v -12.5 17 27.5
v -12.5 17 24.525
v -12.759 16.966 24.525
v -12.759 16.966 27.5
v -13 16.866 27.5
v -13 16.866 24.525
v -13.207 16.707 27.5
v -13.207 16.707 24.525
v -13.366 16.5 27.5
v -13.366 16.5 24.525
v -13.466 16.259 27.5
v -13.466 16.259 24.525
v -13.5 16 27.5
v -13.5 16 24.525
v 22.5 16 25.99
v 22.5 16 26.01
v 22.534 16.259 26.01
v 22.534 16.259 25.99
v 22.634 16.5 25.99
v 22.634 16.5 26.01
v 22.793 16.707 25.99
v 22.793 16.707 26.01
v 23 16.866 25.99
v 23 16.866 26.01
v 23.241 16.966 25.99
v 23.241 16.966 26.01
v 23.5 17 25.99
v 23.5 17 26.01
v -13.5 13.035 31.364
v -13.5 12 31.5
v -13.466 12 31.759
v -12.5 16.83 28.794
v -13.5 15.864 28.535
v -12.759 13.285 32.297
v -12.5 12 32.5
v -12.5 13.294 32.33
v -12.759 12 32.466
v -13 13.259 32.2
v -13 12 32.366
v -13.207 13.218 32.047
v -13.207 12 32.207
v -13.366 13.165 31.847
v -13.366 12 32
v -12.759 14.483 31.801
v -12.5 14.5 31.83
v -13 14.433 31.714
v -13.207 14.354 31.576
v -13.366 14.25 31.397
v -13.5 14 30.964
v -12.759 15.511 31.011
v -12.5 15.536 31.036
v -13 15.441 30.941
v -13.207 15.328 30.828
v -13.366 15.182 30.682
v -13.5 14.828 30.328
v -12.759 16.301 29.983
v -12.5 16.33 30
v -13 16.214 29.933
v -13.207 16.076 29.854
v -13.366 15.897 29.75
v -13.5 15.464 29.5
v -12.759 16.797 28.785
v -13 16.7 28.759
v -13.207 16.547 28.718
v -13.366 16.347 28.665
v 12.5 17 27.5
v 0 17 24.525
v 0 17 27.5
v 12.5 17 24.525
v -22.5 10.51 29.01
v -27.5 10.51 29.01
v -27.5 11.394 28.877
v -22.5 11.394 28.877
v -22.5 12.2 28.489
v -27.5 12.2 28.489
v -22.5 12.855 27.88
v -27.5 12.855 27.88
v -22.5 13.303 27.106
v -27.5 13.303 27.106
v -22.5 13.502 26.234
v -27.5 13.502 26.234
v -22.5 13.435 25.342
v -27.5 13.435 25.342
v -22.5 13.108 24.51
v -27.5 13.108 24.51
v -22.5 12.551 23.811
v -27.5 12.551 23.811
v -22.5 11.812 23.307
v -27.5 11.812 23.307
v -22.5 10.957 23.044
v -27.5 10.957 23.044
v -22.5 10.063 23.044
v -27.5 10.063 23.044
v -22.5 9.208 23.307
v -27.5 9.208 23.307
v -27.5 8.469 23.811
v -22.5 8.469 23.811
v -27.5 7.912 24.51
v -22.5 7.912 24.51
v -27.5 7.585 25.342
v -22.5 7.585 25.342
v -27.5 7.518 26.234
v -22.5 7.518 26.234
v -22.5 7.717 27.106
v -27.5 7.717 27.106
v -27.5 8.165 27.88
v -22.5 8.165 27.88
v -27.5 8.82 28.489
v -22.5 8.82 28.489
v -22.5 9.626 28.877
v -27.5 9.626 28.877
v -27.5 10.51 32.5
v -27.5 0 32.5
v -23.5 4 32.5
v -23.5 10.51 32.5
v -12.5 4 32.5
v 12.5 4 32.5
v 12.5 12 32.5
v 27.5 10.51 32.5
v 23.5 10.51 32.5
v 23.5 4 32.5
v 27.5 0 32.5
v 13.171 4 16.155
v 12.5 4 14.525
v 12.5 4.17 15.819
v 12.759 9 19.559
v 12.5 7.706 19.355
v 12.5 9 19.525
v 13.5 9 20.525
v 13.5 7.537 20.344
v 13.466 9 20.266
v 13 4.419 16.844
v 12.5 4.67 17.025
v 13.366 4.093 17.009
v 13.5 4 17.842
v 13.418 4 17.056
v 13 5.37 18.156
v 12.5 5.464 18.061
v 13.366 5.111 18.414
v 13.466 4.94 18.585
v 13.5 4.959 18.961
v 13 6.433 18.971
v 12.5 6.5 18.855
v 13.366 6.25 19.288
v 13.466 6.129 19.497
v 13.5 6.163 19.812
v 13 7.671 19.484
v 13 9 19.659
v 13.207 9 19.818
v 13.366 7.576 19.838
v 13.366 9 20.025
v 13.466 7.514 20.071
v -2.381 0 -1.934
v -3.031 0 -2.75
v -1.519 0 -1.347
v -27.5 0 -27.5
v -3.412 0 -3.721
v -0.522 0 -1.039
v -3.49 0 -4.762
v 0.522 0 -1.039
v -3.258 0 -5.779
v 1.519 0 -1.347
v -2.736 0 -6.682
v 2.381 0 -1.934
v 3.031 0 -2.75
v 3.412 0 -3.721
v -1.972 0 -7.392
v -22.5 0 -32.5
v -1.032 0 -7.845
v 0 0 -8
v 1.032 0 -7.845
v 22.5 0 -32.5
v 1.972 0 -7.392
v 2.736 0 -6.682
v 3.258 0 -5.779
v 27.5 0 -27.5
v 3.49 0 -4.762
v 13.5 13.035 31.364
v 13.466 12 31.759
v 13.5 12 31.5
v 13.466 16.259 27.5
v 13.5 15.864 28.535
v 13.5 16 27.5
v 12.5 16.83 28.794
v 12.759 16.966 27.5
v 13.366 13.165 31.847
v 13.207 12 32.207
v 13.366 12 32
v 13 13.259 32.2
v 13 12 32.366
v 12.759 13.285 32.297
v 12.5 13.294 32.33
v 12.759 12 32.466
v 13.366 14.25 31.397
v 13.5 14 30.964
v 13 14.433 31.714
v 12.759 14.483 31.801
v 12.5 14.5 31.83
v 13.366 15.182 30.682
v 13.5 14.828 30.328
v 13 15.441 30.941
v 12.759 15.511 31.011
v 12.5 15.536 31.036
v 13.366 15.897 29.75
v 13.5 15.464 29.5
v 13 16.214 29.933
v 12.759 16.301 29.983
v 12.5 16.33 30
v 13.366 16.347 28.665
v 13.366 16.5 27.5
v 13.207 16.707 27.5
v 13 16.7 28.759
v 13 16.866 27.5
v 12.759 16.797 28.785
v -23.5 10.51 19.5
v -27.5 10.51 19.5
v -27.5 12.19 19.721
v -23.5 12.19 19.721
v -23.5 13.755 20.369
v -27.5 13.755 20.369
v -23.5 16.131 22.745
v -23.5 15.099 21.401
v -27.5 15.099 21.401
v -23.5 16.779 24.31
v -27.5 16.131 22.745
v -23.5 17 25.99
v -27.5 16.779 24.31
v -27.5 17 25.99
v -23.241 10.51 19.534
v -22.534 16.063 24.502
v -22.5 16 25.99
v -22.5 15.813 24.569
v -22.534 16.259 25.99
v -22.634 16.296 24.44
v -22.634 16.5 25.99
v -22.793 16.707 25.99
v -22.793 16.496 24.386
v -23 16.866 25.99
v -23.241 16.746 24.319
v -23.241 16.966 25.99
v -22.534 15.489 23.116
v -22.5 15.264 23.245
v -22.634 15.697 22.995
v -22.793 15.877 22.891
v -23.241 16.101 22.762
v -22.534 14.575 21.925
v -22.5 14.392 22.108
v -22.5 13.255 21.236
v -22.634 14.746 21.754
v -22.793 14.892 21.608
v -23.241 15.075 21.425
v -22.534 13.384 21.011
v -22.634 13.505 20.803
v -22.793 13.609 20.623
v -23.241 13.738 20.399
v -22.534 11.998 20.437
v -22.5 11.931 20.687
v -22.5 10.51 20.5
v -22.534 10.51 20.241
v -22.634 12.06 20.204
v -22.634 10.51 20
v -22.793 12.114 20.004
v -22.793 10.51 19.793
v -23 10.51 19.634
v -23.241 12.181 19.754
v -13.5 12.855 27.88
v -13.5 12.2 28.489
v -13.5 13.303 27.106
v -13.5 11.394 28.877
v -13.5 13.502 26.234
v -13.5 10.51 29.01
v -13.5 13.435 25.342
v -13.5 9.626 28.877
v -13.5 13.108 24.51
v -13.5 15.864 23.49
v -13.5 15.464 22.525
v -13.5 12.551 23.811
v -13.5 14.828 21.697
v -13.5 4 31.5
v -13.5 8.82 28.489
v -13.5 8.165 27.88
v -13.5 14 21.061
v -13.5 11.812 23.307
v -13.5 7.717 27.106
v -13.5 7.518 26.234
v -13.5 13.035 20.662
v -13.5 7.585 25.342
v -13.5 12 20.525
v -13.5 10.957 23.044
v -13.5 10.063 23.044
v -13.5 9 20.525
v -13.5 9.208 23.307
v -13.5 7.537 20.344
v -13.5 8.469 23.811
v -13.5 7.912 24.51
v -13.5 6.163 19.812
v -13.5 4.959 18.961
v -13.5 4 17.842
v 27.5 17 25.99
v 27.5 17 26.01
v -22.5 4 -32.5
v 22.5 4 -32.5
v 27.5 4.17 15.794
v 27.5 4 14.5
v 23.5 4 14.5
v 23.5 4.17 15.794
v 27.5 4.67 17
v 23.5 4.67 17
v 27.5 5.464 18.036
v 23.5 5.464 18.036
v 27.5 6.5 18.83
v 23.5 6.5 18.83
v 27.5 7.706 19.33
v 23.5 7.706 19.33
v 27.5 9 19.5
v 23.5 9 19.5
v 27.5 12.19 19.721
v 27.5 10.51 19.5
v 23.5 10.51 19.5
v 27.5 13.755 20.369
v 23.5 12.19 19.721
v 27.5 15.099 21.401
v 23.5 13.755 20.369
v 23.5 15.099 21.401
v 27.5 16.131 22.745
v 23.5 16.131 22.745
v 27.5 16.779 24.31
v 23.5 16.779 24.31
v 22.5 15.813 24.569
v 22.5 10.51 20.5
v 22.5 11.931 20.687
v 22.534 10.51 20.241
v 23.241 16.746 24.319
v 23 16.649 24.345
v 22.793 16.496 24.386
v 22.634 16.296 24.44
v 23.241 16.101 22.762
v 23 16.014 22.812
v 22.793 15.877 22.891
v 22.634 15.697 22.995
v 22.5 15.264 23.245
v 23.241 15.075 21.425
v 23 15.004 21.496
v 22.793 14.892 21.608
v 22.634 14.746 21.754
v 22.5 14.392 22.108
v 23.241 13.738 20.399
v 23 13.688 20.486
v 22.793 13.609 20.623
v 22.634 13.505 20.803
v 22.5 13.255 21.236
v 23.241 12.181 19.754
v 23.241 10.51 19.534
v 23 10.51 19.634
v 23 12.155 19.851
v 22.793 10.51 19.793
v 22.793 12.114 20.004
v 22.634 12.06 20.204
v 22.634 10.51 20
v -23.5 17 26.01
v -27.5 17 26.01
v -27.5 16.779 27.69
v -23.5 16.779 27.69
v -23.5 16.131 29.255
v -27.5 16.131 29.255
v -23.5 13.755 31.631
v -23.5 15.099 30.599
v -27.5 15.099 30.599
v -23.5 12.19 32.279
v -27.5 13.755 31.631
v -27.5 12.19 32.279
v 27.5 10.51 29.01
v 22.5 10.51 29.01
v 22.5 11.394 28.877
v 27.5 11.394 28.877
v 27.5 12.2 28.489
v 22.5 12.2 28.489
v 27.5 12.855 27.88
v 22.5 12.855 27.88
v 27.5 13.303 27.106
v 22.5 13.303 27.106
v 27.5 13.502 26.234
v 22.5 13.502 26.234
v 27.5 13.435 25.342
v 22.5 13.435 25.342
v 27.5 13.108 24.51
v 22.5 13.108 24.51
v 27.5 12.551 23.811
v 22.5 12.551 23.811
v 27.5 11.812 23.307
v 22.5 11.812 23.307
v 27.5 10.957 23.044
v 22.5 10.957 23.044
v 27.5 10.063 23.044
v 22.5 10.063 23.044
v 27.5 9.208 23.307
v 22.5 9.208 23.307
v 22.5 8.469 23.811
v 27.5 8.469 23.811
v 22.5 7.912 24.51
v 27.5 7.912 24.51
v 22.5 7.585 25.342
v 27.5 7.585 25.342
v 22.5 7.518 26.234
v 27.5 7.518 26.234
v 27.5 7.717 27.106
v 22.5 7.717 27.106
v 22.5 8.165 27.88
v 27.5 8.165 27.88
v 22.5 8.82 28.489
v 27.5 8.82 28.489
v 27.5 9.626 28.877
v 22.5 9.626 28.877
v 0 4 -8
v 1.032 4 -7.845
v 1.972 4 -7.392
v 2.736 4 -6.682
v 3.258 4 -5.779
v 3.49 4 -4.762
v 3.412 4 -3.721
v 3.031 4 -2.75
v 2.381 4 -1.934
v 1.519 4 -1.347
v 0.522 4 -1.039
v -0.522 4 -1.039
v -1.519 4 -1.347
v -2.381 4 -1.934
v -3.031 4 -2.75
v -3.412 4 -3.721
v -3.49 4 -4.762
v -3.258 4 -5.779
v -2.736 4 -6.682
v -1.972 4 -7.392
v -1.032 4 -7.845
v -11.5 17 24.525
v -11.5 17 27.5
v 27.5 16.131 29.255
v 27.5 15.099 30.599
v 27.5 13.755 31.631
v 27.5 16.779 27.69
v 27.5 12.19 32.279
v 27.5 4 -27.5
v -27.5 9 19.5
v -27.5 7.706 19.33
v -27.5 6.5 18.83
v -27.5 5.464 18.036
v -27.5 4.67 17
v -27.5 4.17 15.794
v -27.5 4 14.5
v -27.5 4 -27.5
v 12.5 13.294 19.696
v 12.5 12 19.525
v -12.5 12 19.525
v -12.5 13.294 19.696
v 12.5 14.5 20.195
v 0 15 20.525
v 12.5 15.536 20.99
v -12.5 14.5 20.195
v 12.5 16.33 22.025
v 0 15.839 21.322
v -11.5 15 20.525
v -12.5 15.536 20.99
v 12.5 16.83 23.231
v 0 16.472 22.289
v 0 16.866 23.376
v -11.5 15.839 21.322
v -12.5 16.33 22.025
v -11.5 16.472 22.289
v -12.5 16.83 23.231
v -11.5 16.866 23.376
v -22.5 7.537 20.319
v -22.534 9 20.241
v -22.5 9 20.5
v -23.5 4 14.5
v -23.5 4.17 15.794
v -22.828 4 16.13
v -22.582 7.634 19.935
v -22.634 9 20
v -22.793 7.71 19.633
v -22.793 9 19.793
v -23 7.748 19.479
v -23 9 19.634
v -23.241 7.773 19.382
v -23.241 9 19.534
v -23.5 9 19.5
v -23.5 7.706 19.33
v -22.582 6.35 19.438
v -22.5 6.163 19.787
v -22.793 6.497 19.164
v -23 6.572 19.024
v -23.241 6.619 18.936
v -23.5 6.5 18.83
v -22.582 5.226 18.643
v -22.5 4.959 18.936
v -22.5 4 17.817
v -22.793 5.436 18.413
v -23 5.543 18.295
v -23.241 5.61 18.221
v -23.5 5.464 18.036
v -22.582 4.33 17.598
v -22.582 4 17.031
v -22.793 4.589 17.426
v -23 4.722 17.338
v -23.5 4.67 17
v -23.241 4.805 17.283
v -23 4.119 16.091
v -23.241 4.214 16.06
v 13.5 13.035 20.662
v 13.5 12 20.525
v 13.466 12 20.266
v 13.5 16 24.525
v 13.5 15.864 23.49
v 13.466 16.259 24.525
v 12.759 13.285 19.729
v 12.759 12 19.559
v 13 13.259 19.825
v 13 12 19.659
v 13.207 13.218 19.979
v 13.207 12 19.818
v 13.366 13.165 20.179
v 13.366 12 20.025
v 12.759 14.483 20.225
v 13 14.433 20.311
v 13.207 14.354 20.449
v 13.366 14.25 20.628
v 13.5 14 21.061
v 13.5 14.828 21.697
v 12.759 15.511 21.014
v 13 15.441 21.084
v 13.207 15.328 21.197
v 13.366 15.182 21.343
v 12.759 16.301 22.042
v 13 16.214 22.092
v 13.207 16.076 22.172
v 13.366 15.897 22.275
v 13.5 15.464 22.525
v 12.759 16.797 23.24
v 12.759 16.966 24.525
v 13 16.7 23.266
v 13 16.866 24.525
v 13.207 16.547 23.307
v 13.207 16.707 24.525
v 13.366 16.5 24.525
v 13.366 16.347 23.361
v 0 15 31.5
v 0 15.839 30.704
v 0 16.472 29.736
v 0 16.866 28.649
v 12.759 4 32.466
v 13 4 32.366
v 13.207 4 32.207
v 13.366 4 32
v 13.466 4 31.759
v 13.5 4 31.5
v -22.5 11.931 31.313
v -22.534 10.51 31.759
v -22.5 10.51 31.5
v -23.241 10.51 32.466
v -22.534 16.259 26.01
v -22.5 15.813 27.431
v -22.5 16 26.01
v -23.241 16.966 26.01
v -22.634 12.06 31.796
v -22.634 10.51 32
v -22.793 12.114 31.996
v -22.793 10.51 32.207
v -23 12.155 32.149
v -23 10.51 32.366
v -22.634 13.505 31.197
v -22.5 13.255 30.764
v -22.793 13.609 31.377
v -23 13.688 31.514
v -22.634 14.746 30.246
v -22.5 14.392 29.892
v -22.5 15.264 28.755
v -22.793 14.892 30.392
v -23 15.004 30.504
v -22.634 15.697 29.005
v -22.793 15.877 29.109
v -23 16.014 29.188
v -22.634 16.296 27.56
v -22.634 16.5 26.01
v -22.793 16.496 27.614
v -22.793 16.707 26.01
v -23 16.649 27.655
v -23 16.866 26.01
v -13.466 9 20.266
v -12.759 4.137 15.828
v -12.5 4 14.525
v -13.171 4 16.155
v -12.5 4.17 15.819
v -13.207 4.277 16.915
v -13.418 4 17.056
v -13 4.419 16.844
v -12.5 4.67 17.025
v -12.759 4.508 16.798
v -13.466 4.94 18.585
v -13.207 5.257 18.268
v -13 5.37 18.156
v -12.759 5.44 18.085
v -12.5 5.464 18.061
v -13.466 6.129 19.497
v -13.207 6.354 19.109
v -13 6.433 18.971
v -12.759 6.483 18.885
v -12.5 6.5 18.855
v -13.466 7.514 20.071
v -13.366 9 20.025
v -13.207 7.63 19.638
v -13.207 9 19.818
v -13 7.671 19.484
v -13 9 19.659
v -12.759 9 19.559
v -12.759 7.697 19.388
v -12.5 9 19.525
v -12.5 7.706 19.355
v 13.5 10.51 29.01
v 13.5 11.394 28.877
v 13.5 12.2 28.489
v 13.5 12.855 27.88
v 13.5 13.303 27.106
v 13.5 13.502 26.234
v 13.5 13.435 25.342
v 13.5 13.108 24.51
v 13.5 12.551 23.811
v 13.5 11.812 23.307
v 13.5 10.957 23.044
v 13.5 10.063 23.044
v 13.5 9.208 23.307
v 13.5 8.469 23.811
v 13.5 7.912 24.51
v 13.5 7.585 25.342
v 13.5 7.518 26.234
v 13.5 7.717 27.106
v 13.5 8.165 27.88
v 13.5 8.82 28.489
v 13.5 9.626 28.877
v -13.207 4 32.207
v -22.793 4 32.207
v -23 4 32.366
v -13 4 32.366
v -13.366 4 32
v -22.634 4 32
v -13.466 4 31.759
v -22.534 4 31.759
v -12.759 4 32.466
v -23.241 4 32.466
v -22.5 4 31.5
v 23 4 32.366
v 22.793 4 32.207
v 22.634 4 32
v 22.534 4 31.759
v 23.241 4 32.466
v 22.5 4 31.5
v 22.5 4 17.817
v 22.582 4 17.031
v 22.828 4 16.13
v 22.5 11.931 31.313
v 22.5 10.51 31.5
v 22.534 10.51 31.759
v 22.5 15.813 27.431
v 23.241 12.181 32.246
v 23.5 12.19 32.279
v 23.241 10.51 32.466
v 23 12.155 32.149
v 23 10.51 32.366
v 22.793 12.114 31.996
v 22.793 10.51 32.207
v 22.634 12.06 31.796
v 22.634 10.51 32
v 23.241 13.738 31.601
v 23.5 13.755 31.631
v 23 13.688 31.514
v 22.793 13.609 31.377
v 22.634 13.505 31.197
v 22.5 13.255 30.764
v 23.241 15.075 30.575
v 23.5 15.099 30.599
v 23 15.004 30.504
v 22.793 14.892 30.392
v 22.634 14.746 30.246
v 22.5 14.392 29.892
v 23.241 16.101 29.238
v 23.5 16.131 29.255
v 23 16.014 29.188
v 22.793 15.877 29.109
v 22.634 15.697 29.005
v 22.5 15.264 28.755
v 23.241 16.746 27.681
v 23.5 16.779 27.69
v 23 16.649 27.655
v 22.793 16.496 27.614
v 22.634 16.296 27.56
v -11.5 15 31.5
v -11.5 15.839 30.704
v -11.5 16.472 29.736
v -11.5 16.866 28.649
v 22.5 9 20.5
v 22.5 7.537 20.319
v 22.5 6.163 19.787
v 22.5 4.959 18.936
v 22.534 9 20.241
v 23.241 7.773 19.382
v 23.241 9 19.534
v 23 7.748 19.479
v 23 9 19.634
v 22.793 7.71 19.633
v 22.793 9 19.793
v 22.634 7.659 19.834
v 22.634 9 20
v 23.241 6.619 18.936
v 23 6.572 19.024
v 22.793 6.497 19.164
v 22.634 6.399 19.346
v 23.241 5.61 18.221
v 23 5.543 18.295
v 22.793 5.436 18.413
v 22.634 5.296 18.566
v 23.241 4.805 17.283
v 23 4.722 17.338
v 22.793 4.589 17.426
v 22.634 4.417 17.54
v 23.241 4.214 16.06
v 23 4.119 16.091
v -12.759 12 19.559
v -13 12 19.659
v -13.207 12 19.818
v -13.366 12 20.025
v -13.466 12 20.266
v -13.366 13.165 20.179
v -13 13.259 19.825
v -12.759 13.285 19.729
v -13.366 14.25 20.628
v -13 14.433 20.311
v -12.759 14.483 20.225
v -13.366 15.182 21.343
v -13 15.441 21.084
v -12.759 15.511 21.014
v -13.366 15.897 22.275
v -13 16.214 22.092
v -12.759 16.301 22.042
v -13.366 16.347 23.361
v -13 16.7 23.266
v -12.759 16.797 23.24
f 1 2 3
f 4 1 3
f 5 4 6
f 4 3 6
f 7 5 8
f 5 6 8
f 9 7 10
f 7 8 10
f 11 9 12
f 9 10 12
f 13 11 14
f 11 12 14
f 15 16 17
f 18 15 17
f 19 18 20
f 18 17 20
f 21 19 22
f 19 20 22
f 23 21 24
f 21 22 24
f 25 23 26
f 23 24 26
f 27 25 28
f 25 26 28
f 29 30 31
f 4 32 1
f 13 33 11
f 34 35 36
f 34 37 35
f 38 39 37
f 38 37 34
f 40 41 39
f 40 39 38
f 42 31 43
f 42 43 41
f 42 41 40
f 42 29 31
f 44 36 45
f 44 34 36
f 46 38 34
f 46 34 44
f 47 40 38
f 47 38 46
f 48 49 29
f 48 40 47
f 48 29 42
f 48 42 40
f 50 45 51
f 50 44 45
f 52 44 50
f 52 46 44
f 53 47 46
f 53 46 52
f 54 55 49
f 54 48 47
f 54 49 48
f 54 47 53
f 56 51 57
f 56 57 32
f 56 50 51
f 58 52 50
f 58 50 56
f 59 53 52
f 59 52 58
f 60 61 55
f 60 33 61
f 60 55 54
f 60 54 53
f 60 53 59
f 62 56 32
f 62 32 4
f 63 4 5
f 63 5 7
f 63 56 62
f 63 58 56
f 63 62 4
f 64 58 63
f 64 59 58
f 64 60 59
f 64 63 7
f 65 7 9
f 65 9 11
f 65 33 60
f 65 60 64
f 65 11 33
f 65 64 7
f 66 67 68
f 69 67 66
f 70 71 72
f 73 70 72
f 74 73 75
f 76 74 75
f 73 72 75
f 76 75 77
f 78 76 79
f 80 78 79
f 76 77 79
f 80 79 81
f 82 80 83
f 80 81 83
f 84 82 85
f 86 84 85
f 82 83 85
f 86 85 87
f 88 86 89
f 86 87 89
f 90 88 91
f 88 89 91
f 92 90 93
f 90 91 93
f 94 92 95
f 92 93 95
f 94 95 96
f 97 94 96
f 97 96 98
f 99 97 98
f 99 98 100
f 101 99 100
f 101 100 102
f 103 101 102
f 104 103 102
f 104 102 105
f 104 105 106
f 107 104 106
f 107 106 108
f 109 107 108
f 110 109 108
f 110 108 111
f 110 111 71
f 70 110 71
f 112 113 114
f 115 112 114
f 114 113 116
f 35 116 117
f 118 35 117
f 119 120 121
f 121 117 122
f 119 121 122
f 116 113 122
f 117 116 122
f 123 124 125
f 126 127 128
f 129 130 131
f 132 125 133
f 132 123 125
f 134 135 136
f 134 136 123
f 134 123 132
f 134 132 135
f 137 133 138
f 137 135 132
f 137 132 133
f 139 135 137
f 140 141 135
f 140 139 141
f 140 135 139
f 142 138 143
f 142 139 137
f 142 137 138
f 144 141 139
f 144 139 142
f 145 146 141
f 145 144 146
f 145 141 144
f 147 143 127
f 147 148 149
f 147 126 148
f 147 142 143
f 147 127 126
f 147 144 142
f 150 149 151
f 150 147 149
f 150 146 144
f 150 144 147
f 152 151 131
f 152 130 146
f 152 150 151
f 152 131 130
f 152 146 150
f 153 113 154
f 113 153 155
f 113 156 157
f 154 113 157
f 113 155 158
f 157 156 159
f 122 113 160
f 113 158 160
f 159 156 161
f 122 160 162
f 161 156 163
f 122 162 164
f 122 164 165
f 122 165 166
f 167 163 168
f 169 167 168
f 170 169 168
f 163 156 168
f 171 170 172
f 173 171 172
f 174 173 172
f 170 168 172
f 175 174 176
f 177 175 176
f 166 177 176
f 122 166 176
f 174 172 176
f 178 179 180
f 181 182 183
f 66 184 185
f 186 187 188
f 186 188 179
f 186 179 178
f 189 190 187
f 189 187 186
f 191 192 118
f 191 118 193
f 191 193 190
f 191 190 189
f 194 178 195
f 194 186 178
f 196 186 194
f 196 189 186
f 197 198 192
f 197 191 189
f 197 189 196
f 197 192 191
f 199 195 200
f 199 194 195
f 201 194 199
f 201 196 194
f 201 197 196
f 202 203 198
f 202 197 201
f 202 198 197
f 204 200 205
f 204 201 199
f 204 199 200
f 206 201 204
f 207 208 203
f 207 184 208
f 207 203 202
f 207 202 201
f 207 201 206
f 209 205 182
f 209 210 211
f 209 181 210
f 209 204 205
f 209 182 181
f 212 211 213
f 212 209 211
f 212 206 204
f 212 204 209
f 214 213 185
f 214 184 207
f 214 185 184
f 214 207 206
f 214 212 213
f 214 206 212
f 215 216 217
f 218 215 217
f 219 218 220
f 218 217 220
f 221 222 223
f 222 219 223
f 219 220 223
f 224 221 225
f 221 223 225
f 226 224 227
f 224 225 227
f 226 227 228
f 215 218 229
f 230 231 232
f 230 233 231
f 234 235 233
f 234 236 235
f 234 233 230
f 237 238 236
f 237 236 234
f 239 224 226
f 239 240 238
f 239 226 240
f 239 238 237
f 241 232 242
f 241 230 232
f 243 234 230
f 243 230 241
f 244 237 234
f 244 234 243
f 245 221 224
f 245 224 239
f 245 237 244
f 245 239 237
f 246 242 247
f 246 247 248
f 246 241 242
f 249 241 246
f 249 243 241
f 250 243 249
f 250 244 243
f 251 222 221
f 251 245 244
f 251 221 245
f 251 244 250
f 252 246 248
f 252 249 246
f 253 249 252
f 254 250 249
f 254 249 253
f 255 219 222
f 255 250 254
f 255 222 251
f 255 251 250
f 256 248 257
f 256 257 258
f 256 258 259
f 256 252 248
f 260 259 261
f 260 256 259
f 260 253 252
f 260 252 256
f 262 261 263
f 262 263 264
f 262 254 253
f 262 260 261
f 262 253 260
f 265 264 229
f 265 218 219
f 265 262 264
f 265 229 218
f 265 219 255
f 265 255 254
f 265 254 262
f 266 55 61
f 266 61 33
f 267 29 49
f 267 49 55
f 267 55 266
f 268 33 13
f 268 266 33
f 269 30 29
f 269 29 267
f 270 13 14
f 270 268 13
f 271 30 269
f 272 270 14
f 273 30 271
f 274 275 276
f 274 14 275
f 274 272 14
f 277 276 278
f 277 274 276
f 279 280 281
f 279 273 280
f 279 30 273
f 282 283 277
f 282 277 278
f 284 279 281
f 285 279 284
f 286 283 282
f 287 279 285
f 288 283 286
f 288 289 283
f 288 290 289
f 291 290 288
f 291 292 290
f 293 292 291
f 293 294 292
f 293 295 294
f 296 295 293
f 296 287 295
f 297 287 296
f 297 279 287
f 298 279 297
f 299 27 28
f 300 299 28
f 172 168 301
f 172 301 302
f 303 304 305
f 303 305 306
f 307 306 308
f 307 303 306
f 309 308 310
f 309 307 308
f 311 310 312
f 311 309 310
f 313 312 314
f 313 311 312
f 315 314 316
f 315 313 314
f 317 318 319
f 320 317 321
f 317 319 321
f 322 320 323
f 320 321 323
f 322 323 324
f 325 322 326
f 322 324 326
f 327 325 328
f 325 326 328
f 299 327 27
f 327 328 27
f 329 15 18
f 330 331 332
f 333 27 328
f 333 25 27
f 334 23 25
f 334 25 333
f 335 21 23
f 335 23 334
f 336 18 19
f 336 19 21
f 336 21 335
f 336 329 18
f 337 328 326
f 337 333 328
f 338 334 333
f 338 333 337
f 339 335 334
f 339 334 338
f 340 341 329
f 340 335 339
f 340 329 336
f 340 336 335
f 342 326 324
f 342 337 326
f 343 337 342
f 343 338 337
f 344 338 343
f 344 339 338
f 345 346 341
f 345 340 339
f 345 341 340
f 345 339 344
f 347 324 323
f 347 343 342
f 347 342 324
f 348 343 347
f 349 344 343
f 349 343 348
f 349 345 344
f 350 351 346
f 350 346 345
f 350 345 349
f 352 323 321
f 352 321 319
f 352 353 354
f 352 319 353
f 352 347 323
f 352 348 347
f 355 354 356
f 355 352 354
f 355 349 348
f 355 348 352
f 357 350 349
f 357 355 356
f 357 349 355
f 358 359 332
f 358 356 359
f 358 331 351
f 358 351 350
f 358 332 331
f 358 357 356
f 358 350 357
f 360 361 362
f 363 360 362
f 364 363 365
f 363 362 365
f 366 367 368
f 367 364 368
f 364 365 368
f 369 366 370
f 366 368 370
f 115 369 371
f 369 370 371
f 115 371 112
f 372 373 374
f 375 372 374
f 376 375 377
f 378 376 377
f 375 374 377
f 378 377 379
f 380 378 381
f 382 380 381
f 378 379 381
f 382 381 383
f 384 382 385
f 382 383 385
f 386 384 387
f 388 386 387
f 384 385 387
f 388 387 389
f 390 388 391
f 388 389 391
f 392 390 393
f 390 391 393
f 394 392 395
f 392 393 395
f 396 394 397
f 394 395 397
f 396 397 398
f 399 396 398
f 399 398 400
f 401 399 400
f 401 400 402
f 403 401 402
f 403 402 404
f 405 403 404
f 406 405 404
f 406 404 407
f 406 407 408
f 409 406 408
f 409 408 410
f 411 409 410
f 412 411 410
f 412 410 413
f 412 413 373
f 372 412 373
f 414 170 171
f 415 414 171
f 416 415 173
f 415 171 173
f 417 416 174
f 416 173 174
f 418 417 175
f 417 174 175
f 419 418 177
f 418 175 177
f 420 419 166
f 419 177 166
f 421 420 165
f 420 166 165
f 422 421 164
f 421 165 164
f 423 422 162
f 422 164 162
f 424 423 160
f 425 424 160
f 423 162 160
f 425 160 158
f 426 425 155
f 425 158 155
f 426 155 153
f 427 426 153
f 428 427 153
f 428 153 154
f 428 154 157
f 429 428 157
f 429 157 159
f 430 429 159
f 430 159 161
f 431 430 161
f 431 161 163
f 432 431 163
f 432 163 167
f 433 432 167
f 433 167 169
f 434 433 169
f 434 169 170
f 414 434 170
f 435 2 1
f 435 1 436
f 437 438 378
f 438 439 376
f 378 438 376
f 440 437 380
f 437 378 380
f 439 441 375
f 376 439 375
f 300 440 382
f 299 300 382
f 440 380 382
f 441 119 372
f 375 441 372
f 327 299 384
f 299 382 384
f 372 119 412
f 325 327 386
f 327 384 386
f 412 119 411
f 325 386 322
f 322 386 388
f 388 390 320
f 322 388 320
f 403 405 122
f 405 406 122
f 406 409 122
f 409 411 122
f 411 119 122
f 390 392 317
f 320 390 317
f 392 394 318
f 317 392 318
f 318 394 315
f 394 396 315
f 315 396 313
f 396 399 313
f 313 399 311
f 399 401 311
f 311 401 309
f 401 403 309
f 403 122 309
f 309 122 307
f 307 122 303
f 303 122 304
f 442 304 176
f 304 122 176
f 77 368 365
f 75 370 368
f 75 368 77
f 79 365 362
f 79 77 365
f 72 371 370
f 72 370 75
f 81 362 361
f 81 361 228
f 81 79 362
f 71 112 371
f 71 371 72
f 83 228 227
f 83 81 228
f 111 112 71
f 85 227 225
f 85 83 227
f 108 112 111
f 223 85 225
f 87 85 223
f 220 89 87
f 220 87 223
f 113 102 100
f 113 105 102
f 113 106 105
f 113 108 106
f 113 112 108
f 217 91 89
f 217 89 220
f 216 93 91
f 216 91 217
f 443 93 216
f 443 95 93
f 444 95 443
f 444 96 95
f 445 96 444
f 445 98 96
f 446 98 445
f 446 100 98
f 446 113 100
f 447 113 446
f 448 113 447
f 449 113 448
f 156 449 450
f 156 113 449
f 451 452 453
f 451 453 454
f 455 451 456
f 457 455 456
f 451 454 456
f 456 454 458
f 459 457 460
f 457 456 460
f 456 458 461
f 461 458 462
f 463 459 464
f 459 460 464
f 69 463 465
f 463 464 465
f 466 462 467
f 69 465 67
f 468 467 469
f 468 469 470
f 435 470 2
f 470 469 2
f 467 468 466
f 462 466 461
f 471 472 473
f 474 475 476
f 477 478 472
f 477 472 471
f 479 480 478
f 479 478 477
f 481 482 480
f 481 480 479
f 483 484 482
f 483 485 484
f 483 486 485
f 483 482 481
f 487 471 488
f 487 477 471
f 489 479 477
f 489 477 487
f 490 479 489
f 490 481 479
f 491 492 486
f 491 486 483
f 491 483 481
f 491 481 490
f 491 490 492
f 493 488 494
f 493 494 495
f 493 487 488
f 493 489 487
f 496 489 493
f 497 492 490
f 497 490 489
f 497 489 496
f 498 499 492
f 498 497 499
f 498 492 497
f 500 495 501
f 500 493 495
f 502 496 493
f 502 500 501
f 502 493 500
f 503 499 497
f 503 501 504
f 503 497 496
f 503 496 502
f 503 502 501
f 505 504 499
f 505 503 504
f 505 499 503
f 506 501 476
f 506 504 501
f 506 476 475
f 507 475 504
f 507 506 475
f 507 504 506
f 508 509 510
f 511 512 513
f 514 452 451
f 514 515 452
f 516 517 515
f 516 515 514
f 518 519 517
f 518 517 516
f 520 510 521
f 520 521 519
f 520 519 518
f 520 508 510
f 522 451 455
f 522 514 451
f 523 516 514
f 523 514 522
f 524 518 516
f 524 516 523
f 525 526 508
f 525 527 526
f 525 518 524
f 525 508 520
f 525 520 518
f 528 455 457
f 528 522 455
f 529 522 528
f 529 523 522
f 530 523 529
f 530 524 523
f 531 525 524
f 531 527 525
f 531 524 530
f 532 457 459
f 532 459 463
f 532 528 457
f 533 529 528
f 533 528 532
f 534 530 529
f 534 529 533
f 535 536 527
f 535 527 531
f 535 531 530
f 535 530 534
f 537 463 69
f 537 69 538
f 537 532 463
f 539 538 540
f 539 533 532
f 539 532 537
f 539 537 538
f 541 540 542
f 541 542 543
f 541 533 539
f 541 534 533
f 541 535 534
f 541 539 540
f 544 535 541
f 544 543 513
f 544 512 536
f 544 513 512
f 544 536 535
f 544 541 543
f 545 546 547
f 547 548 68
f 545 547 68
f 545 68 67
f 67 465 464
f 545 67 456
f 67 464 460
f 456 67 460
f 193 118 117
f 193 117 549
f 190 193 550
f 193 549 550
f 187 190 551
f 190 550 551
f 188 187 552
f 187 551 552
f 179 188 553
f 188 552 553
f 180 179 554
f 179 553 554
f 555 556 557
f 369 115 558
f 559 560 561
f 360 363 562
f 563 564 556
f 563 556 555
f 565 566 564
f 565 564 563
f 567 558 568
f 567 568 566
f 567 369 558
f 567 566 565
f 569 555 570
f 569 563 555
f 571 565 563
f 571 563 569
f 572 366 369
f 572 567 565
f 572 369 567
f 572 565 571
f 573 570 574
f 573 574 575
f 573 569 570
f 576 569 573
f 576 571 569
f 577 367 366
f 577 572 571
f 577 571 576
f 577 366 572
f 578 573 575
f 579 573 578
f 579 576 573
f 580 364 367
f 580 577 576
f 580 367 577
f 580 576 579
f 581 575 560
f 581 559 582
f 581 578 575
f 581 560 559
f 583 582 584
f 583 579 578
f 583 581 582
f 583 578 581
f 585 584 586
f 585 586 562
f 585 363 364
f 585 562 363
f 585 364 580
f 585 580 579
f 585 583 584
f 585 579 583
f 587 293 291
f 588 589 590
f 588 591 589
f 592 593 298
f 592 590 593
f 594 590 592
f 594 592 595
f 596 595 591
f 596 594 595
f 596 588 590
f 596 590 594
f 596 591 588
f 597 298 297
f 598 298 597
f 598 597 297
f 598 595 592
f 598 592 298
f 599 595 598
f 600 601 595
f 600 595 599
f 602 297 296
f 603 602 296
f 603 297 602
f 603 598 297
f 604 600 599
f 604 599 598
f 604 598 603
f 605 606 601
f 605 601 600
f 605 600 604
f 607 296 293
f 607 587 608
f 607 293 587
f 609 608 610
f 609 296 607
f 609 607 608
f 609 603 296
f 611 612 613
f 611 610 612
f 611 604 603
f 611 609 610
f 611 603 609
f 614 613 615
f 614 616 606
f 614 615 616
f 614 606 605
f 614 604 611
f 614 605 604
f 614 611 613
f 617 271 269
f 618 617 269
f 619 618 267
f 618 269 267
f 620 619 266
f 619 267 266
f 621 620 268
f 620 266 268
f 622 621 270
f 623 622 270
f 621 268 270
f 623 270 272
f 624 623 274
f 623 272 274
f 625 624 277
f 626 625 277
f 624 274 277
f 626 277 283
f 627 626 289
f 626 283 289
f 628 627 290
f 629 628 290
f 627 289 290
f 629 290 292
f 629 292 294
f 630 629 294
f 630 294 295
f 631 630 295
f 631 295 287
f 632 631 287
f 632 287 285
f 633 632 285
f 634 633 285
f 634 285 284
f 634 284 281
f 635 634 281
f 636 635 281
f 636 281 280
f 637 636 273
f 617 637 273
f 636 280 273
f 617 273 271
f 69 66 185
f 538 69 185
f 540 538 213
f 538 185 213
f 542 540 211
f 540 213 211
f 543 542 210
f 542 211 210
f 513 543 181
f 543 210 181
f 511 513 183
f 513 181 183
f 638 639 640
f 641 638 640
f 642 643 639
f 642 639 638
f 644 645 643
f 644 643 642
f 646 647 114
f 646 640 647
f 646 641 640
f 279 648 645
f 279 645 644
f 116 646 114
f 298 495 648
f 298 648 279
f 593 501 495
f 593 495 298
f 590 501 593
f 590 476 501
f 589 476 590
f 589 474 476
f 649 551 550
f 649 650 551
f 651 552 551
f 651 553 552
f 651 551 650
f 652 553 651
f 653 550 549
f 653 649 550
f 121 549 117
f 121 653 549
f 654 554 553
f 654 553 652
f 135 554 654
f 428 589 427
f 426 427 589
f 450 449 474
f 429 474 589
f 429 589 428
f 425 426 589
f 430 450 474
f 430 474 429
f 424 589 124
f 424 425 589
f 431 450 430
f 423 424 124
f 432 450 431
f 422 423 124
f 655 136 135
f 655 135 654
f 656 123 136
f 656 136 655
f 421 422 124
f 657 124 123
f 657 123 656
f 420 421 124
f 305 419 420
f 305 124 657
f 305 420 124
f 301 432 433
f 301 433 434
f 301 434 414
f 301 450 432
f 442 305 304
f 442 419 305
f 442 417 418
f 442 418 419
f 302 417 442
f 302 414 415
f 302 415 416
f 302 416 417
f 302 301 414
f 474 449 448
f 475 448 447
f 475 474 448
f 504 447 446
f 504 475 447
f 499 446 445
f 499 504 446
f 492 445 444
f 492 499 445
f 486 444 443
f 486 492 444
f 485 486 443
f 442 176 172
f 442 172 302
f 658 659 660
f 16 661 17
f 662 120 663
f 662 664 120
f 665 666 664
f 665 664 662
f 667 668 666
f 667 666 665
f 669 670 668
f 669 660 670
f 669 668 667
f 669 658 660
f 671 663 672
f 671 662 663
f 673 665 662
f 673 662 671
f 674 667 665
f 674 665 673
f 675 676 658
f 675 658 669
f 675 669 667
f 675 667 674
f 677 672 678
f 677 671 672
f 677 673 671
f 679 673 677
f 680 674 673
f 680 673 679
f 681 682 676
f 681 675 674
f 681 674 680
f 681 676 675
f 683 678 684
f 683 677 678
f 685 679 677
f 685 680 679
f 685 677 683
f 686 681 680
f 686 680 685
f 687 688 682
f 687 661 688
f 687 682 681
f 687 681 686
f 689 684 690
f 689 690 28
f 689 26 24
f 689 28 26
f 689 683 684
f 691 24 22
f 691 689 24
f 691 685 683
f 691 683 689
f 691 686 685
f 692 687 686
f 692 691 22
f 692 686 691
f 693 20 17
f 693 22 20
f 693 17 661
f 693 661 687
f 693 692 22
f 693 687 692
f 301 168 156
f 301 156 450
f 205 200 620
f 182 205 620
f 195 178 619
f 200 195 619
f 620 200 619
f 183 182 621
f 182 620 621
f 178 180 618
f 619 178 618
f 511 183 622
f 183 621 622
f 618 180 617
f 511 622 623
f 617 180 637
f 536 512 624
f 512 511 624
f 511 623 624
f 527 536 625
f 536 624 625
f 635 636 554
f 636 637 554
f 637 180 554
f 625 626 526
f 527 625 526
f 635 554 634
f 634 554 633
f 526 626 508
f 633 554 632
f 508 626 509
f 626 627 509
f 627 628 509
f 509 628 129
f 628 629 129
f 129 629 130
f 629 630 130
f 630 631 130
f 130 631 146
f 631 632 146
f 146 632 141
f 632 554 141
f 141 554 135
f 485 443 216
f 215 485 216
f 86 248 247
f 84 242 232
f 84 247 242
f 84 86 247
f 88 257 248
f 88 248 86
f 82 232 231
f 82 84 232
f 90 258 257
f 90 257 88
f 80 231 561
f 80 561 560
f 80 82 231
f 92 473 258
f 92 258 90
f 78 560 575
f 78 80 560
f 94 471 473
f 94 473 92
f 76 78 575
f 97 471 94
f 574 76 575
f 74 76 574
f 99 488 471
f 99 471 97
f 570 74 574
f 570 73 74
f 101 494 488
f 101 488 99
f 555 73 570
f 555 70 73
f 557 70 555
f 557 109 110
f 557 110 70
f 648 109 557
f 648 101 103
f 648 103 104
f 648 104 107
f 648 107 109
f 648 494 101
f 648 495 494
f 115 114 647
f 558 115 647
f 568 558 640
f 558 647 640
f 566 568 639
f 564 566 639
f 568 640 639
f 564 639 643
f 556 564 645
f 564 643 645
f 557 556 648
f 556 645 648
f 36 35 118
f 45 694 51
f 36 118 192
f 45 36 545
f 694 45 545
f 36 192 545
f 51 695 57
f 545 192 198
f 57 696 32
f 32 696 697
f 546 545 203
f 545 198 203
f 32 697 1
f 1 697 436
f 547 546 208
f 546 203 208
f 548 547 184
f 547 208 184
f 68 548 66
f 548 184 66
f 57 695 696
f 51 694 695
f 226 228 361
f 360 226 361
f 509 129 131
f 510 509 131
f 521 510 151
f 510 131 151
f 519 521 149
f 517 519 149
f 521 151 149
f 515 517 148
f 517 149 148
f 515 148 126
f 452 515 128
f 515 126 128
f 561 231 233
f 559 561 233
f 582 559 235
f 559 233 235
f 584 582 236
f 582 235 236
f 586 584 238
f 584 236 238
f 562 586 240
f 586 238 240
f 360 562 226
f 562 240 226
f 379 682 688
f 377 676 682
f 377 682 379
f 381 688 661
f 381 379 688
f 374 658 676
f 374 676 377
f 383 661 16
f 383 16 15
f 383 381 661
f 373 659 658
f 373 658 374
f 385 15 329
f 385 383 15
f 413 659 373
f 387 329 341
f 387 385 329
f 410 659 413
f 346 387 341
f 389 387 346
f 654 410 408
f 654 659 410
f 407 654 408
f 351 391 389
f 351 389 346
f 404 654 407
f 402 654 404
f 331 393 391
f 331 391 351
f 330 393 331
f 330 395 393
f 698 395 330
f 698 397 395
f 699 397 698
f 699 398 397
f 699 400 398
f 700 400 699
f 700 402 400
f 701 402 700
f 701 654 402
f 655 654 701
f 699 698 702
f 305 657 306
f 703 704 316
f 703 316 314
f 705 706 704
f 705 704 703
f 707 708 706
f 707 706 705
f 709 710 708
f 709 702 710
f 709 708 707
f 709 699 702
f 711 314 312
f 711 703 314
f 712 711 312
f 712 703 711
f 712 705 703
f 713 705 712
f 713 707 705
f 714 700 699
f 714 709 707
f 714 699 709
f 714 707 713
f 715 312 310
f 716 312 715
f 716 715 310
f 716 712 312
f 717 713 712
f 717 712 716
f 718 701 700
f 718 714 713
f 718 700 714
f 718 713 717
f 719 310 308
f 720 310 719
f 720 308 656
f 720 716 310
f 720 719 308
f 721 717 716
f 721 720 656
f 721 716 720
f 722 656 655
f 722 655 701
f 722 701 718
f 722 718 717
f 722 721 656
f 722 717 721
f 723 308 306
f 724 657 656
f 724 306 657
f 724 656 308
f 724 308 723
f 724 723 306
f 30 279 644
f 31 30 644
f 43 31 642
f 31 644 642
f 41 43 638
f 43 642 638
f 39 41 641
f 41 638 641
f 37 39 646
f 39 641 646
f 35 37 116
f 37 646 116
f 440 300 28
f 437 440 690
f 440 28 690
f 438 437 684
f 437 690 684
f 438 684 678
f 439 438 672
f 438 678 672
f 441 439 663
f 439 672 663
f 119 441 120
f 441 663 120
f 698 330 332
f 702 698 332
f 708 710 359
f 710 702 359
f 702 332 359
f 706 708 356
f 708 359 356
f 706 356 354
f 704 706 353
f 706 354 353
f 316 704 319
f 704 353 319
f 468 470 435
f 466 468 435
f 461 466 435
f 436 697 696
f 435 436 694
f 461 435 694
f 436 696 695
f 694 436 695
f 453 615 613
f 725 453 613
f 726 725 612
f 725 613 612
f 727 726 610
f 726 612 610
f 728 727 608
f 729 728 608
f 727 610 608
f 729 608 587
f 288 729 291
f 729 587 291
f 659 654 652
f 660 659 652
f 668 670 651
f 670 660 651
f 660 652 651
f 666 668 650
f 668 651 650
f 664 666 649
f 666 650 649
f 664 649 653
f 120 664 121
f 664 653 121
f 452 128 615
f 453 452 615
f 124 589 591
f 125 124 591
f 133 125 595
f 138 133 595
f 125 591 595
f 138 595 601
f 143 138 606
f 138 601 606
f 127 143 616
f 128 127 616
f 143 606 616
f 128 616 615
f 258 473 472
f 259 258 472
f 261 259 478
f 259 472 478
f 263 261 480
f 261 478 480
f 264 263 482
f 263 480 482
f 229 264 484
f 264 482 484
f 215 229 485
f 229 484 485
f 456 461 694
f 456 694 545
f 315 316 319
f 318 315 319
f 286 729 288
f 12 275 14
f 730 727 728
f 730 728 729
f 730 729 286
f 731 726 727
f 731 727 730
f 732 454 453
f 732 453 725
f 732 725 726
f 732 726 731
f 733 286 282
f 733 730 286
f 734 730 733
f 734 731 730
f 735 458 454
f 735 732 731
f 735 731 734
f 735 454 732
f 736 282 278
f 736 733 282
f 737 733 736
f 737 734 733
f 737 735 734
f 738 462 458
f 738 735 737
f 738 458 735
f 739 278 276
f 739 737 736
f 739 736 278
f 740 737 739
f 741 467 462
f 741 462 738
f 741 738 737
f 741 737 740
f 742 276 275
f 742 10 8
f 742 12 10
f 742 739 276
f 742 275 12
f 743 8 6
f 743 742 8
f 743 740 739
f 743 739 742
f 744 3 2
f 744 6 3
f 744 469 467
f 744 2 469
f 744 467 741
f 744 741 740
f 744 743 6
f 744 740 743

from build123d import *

# Parameters (mm, degrees)
CROQUIS1_W              = 55
CROQUIS1_H              = 65
SALIENTE_EXTRUIR1_DEPTH = 4
CROQUIS5_R              = 3.5
CORTAR_EXTRUIR5_DEPTH   = 72
CHAFL_N1_SIZE           = 5
CROQUIS6_R              = 3
SALIENTE_EXTRUIR2_DEPTH = 55
REDONDEO1_R             = 5
CROQUIS7_W              = 45
CROQUIS7_H              = 13
CROQUIS7_H_2            = 7.525704533
CORTAR_EXTRUIR7_DEPTH   = 20
REDONDEO2_R             = 1
CROQUIS8_W              = 13.499994095
CROQUIS8_H              = 12.974747115
SALIENTE_EXTRUIR3_DEPTH = 13
REDONDEO3_R             = 5
REDONDEO4_R             = 5
REDONDEO5_R             = 1
CROQUIS10_R             = 3
CORTAR_EXTRUIR8_DEPTH   = 26.999988191
CROQUIS11_W             = 11.5
CROQUIS11_H             = 5.447296535
CROQUIS11_H_2           = 2.974747115
CORTAR_EXTRUIR9_DEPTH   = 2


with BuildPart() as part:
    # Croquis1 → Saliente-Extruir1 (new body)
    with BuildSketch(Plane(origin=(0, 0, 0), x_dir=(1, 0, 0), z_dir=(0, 1, 0))):
        Rectangle(CROQUIS1_W, CROQUIS1_H)
    extrude(amount=SALIENTE_EXTRUIR1_DEPTH)

    # Croquis5 → Cortar-Extruir5 (cut)
    with BuildSketch(Plane.XZ):
        with Locations(Location((0, -4.5, 0), (0, 0, 270))):
            Circle(CROQUIS5_R)
    extrude(amount=-CORTAR_EXTRUIR5_DEPTH, mode=Mode.SUBTRACT)

    # Chaflán1
    chafl_n1_edges = [part.edges().sort_by_distance(p)[0] for p in [
        (-27.5, 2, -32.5),
        (27.5, 2, -32.5),
    ]]
    chamfer(chafl_n1_edges, length=CHAFL_N1_SIZE)

    # Croquis6 → Saliente-Extruir2 (add)
    with BuildSketch(Plane.ZY.offset(27.5)):
        with BuildLine():
            Line((32.5, 0), (19.5, 0))
            Line((19.5, 0), (19.5, 10.51))
            ThreePointArc((19.5, 10.51), (21.40087699, 15.09912301), (25.99, 17))
            Line((25.99, 17), (26.01, 17))
            ThreePointArc((26.01, 17), (30.59912301, 15.09912301), (32.5, 10.51))
            Line((32.5, 10.51), (32.5, 0))
        make_face()
        with Locations((26.01, 10.51)):
            Circle(CROQUIS6_R, mode=Mode.SUBTRACT)
    extrude(amount=-SALIENTE_EXTRUIR2_DEPTH)

    # Redondeo1
    redondeo1_edges = [part.edges().sort_by_distance(p)[0] for p in [
        (0, 4, 19.5),
    ]]
    fillet(redondeo1_edges, radius=REDONDEO1_R)

    # Croquis7 → Cortar-Extruir7 (cut)
    with BuildSketch(Plane(origin=(0, 4, 0), x_dir=(1, 0, 0), z_dir=(0, 1, 0))):
        with Locations((0, -26)):
            Rectangle(CROQUIS7_W, CROQUIS7_H)
        with Locations((0, -15.737147734)):
            Rectangle(CROQUIS7_W, CROQUIS7_H_2)
    extrude(amount=CORTAR_EXTRUIR7_DEPTH, mode=Mode.SUBTRACT)

    # Redondeo2
    # the kernel refuses this fillet: 1 mm, written as the material it takes off along each edge
    with BuildSketch(Plane(origin=(22.5, 9, 14.5), x_dir=(0, 0, 1), z_dir=(0, 1, 0))) as redondeo2_piece_1_section:
        with BuildLine():
            CenterArc((5 + REDONDEO2_R, REDONDEO2_R), REDONDEO2_R, 180, 90)
            Line((5 + REDONDEO2_R, 0), (5, 0))
            Line((5, 0), (5, REDONDEO2_R))
        make_face()
    redondeo2_piece_1 = revolve(axis=Axis((22.5, 9, 14.5), (1, 0, 0)), revolution_arc=138.720976341, mode=Mode.PRIVATE)
    redondeo2_piece_1 = split(redondeo2_piece_1, bisect_by=Plane(origin=(22.5, 4, 14.5), z_dir=(0, 1, 0)), keep=Keep.TOP, mode=Mode.PRIVATE)
    add(redondeo2_piece_1, mode=Mode.SUBTRACT)
    with BuildSketch(Plane(origin=(-22.5, 9, 14.5), x_dir=(0, 0, 1), z_dir=(0, 1, 0))) as redondeo2_piece_2_section:
        with BuildLine():
            CenterArc((5 + REDONDEO2_R, -REDONDEO2_R), REDONDEO2_R, 90, 90)
            Line((5 + REDONDEO2_R, 0), (5, 0))
            Line((5, 0), (5, -REDONDEO2_R))
        make_face()
    redondeo2_piece_2 = revolve(axis=Axis((-22.5, 9, 14.5), (1, 0, 0)), revolution_arc=138.720976341, mode=Mode.PRIVATE)
    redondeo2_piece_2 = split(redondeo2_piece_2, bisect_by=Plane(origin=(-22.5, 4, 14.5), z_dir=(0, 1, 0)), keep=Keep.TOP, mode=Mode.PRIVATE)
    add(redondeo2_piece_2, mode=Mode.SUBTRACT)
    with BuildSketch(Plane(origin=(-22.5, 4, 32.5), x_dir=(-1, 0, 0), z_dir=(0, 1, 0))) as redondeo2_piece_3:
        with BuildLine():
            CenterArc((REDONDEO2_R, -REDONDEO2_R), REDONDEO2_R, 90, 90)
            Line((0, -REDONDEO2_R), (0, 0))
            Line((0, 0), (REDONDEO2_R, 0))
        make_face()
    extrude(amount=6.51, mode=Mode.SUBTRACT)
    with BuildSketch(Plane(origin=(-22.5, 17, 25.99), x_dir=(-1, 0, 0), z_dir=(0, 0, 1))) as redondeo2_piece_4:
        with BuildLine():
            CenterArc((REDONDEO2_R, REDONDEO2_R), REDONDEO2_R, 180, 90)
            Line((0, REDONDEO2_R), (0, 0))
            Line((0, 0), (REDONDEO2_R, 0))
        make_face()
    extrude(amount=0.02, mode=Mode.SUBTRACT)
    with BuildSketch(Plane(origin=(-22.5, 10.51, 26.01), x_dir=(0, 0, 1), z_dir=(0, -1, 0))) as redondeo2_piece_5:
        with BuildLine():
            CenterArc((6.49 - REDONDEO2_R, REDONDEO2_R), REDONDEO2_R, 270, 90)
            Line((6.49 - REDONDEO2_R, 0), (6.49, 0))
            Line((6.49, 0), (6.49, REDONDEO2_R))
        make_face()
    revolve(axis=Axis((-22.5, 10.51, 26.01), (-1, 0, 0)), revolution_arc=90, mode=Mode.SUBTRACT)
    with BuildSketch(Plane(origin=(-22.5, 9, 19.5), x_dir=(-1, 0, 0), z_dir=(0, 1, 0))) as redondeo2_piece_6:
        with BuildLine():
            CenterArc((REDONDEO2_R, REDONDEO2_R), REDONDEO2_R, 180, 90)
            Line((0, REDONDEO2_R), (0, 0))
            Line((0, 0), (REDONDEO2_R, 0))
        make_face()
    extrude(amount=1.51, mode=Mode.SUBTRACT)
    with BuildSketch(Plane(origin=(-22.5, 10.51, 25.99), x_dir=(0, 1, 0), z_dir=(0, 0, 1))) as redondeo2_piece_7:
        with BuildLine():
            CenterArc((6.49 - REDONDEO2_R, REDONDEO2_R), REDONDEO2_R, 270, 90)
            Line((6.49 - REDONDEO2_R, 0), (6.49, 0))
            Line((6.49, 0), (6.49, REDONDEO2_R))
        make_face()
    revolve(axis=Axis((-22.5, 10.51, 25.99), (-1, 0, 0)), revolution_arc=90, mode=Mode.SUBTRACT)
    with BuildSketch(Plane(origin=(22.5, 17, 26.01), x_dir=(0, -1, 0), z_dir=(0, 0, -1))) as redondeo2_piece_8:
        with BuildLine():
            CenterArc((REDONDEO2_R, -REDONDEO2_R), REDONDEO2_R, 90, 90)
            Line((0, -REDONDEO2_R), (0, 0))
            Line((0, 0), (REDONDEO2_R, 0))
        make_face()
    extrude(amount=0.02, mode=Mode.SUBTRACT)
    with BuildSketch(Plane(origin=(22.5, 10.51, 26.01), x_dir=(0, 0, 1), z_dir=(0, -1, 0))) as redondeo2_piece_9:
        with BuildLine():
            CenterArc((6.49 - REDONDEO2_R, -REDONDEO2_R), REDONDEO2_R, 0, 90)
            Line((6.49 - REDONDEO2_R, 0), (6.49, 0))
            Line((6.49, 0), (6.49, -REDONDEO2_R))
        make_face()
    revolve(axis=Axis((22.5, 10.51, 26.01), (-1, 0, 0)), revolution_arc=90, mode=Mode.SUBTRACT)
    with BuildSketch(Plane(origin=(22.5, 4, 32.5), x_dir=(1, 0, 0), z_dir=(0, 1, 0))) as redondeo2_piece_10:
        with BuildLine():
            CenterArc((REDONDEO2_R, REDONDEO2_R), REDONDEO2_R, 180, 90)
            Line((0, REDONDEO2_R), (0, 0))
            Line((0, 0), (REDONDEO2_R, 0))
        make_face()
    extrude(amount=6.51, mode=Mode.SUBTRACT)
    with BuildSketch(Plane(origin=(22.5, 10.51, 19.5), x_dir=(0, 0, 1), z_dir=(0, -1, 0))) as redondeo2_piece_11:
        with BuildLine():
            CenterArc((REDONDEO2_R, -REDONDEO2_R), REDONDEO2_R, 90, 90)
            Line((0, -REDONDEO2_R), (0, 0))
            Line((0, 0), (REDONDEO2_R, 0))
        make_face()
    extrude(amount=1.51, mode=Mode.SUBTRACT)
    with BuildSketch(Plane(origin=(22.5, 10.51, 25.99), x_dir=(0, 1, 0), z_dir=(0, 0, 1))) as redondeo2_piece_12:
        with BuildLine():
            CenterArc((6.49 - REDONDEO2_R, -REDONDEO2_R), REDONDEO2_R, 0, 90)
            Line((6.49, -REDONDEO2_R), (6.49, 0))
            Line((6.49, 0), (6.49 - REDONDEO2_R, 0))
        make_face()
    revolve(axis=Axis((22.5, 10.51, 25.99), (-1, 0, 0)), revolution_arc=90, mode=Mode.SUBTRACT)

    # Croquis8 → Saliente-Extruir3 (add)
    with BuildSketch(Plane(origin=(0, 4, 0), x_dir=(1, 0, 0), z_dir=(0, 1, 0))):
        with Locations((-6.749997048, -26.012626443)):
            Rectangle(CROQUIS8_W, CROQUIS8_H)
        with Locations((6.749997048, -26.012626443)):
            Rectangle(CROQUIS8_W, CROQUIS8_H)
    extrude(amount=SALIENTE_EXTRUIR3_DEPTH)

    # Redondeo3
    redondeo3_edges = [part.edges().sort_by_distance(p)[0] for p in [
        (0, 17, 19.525252885),
        (0, 17, 32.5),
    ]]
    fillet(redondeo3_edges, radius=REDONDEO3_R)

    # Redondeo4
    redondeo4_edges = [part.edges().sort_by_distance(p)[0] for p in [
        (0, 4, 19.525252885),
    ]]
    fillet(redondeo4_edges, radius=REDONDEO4_R)

    # Redondeo5
    # the kernel refuses this fillet: 1 mm, written as the material it takes off along each edge
    with BuildSketch(Plane(origin=(-13.499994095, 9, 19.525252885), x_dir=(0, 0, 1), z_dir=(0, 1, 0))) as redondeo5_piece_1:
        with BuildLine():
            CenterArc((REDONDEO5_R, REDONDEO5_R), REDONDEO5_R, 180, 90)
            Line((0, REDONDEO5_R), (0, 0))
            Line((0, 0), (REDONDEO5_R, 0))
        make_face()
    extrude(amount=3, mode=Mode.SUBTRACT)
    with BuildSketch(Plane(origin=(13.499994095, 9, 19.525252885), x_dir=(0, 0, 1), z_dir=(0, 1, 0))) as redondeo5_piece_2:
        with BuildLine():
            CenterArc((REDONDEO5_R, -REDONDEO5_R), REDONDEO5_R, 90, 90)
            Line((0, -REDONDEO5_R), (0, 0))
            Line((0, 0), (REDONDEO5_R, 0))
        make_face()
    extrude(amount=3, mode=Mode.SUBTRACT)
    with BuildSketch(Plane(origin=(13.499994095, 17, 27.5), x_dir=(0, -1, 0), z_dir=(0, 0, -1)), Plane(origin=(-13.499994095, 17, 24.525252885), x_dir=(0, -1, 0), z_dir=(0, 0, 1))) as redondeo5_piece_3:
        with BuildLine():
            CenterArc((REDONDEO5_R, REDONDEO5_R), REDONDEO5_R, 180, 90)
            Line((0, REDONDEO5_R), (0, 0))
            Line((0, 0), (REDONDEO5_R, 0))
        make_face()
    extrude(amount=2.974747115, mode=Mode.SUBTRACT)
    with BuildSketch(Plane(origin=(13.499994095, 4, 32.5), x_dir=(0, 0, -1), z_dir=(0, 1, 0))) as redondeo5_piece_4:
        with BuildLine():
            CenterArc((REDONDEO5_R, REDONDEO5_R), REDONDEO5_R, 180, 90)
            Line((0, REDONDEO5_R), (0, 0))
            Line((0, 0), (REDONDEO5_R, 0))
        make_face()
    extrude(amount=8, mode=Mode.SUBTRACT)
    with BuildSketch(Plane(origin=(13.499994095, 12, 27.5), x_dir=(0, 0, 1), z_dir=(0, -1, 0))) as redondeo5_piece_5:
        with BuildLine():
            CenterArc((5 - REDONDEO5_R, REDONDEO5_R), REDONDEO5_R, 270, 90)
            Line((5, REDONDEO5_R), (5, 0))
            Line((5, 0), (5 - REDONDEO5_R, 0))
        make_face()
    revolve(axis=Axis((13.499994095, 12, 27.5), (-1, 0, 0)), revolution_arc=90, mode=Mode.SUBTRACT)
    with BuildSketch(Plane(origin=(13.499994095, 12, 24.525252885), x_dir=(0, 0, -1), z_dir=(0, -1, 0))) as redondeo5_piece_6:
        with BuildLine():
            CenterArc((5 - REDONDEO5_R, -REDONDEO5_R), REDONDEO5_R, 0, 90)
            Line((5, -REDONDEO5_R), (5, 0))
            Line((5, 0), (5 - REDONDEO5_R, 0))
        make_face()
    revolve(axis=Axis((13.499994095, 12, 24.525252885), (1, 0, 0)), revolution_arc=90, mode=Mode.SUBTRACT)
    with BuildSketch(Plane(origin=(-13.499994095, 4, 32.5), x_dir=(0, 0, -1), z_dir=(0, 1, 0))) as redondeo5_piece_7:
        with BuildLine():
            CenterArc((REDONDEO5_R, -REDONDEO5_R), REDONDEO5_R, 90, 90)
            Line((0, -REDONDEO5_R), (0, 0))
            Line((0, 0), (REDONDEO5_R, 0))
        make_face()
    extrude(amount=8, mode=Mode.SUBTRACT)
    with BuildSketch(Plane(origin=(-13.499994095, 12, 27.5), x_dir=(0, 0, 1), z_dir=(0, -1, 0))) as redondeo5_piece_8:
        with BuildLine():
            CenterArc((5 - REDONDEO5_R, -REDONDEO5_R), REDONDEO5_R, 0, 90)
            Line((5, -REDONDEO5_R), (5, 0))
            Line((5, 0), (5 - REDONDEO5_R, 0))
        make_face()
    revolve(axis=Axis((-13.499994095, 12, 27.5), (-1, 0, 0)), revolution_arc=90, mode=Mode.SUBTRACT)
    with BuildSketch(Plane(origin=(-13.499994095, 12, 24.525252885), x_dir=(0, 0, -1), z_dir=(0, -1, 0))) as redondeo5_piece_9:
        with BuildLine():
            CenterArc((5 - REDONDEO5_R, REDONDEO5_R), REDONDEO5_R, 270, 90)
            Line((5, REDONDEO5_R), (5, 0))
            Line((5, 0), (5 - REDONDEO5_R, 0))
        make_face()
    revolve(axis=Axis((-13.499994095, 12, 24.525252885), (1, 0, 0)), revolution_arc=90, mode=Mode.SUBTRACT)
    with BuildSketch(Plane(origin=(13.499994095, 9, 14.525252885), x_dir=(0, -0.6597265812708417, -0.7515057138603056), z_dir=(0, 0.7515057138603056, -0.6597265812708417))) as redondeo5_piece_10_section:
        with BuildLine():
            CenterArc((5 + REDONDEO5_R, REDONDEO5_R), REDONDEO5_R, 180, 90)
            Line((5 + REDONDEO5_R, 0), (5, 0))
            Line((5, 0), (5, REDONDEO5_R))
        make_face()
    redondeo5_piece_10 = revolve(axis=Axis((13.499994095, 9, 14.525252885), (-1, 0, 0)), revolution_arc=138.720976341, mode=Mode.PRIVATE)
    redondeo5_piece_10 = split(redondeo5_piece_10, bisect_by=Plane(origin=(13.499994095, 4, 14.525252885), z_dir=(0, 1, 0)), keep=Keep.TOP, mode=Mode.PRIVATE)
    add(redondeo5_piece_10, mode=Mode.SUBTRACT)
    with BuildSketch(Plane(origin=(-13.499994095, 9, 14.525252885), x_dir=(0, -0.6597265812708417, -0.7515057138603056), z_dir=(0, 0.7515057138603056, -0.6597265812708417))) as redondeo5_piece_11_section:
        with BuildLine():
            CenterArc((5 + REDONDEO5_R, -REDONDEO5_R), REDONDEO5_R, 90, 90)
            Line((5, -REDONDEO5_R), (5, 0))
            Line((5, 0), (5 + REDONDEO5_R, 0))
        make_face()
    redondeo5_piece_11 = revolve(axis=Axis((-13.499994095, 9, 14.525252885), (-1, 0, 0)), revolution_arc=138.720976341, mode=Mode.PRIVATE)
    redondeo5_piece_11 = split(redondeo5_piece_11, bisect_by=Plane(origin=(-13.499994095, 4, 14.525252885), z_dir=(0, 1, 0)), keep=Keep.TOP, mode=Mode.PRIVATE)
    add(redondeo5_piece_11, mode=Mode.SUBTRACT)

    # Croquis10 → Cortar-Extruir8 (cut)
    with BuildSketch(Plane.ZY.offset(13.499994095)):
        with Locations((26.01, 10.51)):
            Circle(CROQUIS10_R)
    extrude(amount=-CORTAR_EXTRUIR8_DEPTH, mode=Mode.SUBTRACT)

    # Croquis11 → Cortar-Extruir9 (cut)
    with BuildSketch(Plane(origin=(0, 17, 0), x_dir=(1, 0, 0), z_dir=(0, 1, 0))):
        with Locations((-5.749994095, -21.801604618)):
            Rectangle(CROQUIS11_W, CROQUIS11_H)
        with Locations((-5.749994095, -26.012626443)):
            Rectangle(CROQUIS11_W, CROQUIS11_H_2)
        with Locations((-5.749994095, -30.223648267)):
            Rectangle(CROQUIS11_W, CROQUIS11_H)
    extrude(amount=-CORTAR_EXTRUIR9_DEPTH, mode=Mode.SUBTRACT)


solid = part.part
